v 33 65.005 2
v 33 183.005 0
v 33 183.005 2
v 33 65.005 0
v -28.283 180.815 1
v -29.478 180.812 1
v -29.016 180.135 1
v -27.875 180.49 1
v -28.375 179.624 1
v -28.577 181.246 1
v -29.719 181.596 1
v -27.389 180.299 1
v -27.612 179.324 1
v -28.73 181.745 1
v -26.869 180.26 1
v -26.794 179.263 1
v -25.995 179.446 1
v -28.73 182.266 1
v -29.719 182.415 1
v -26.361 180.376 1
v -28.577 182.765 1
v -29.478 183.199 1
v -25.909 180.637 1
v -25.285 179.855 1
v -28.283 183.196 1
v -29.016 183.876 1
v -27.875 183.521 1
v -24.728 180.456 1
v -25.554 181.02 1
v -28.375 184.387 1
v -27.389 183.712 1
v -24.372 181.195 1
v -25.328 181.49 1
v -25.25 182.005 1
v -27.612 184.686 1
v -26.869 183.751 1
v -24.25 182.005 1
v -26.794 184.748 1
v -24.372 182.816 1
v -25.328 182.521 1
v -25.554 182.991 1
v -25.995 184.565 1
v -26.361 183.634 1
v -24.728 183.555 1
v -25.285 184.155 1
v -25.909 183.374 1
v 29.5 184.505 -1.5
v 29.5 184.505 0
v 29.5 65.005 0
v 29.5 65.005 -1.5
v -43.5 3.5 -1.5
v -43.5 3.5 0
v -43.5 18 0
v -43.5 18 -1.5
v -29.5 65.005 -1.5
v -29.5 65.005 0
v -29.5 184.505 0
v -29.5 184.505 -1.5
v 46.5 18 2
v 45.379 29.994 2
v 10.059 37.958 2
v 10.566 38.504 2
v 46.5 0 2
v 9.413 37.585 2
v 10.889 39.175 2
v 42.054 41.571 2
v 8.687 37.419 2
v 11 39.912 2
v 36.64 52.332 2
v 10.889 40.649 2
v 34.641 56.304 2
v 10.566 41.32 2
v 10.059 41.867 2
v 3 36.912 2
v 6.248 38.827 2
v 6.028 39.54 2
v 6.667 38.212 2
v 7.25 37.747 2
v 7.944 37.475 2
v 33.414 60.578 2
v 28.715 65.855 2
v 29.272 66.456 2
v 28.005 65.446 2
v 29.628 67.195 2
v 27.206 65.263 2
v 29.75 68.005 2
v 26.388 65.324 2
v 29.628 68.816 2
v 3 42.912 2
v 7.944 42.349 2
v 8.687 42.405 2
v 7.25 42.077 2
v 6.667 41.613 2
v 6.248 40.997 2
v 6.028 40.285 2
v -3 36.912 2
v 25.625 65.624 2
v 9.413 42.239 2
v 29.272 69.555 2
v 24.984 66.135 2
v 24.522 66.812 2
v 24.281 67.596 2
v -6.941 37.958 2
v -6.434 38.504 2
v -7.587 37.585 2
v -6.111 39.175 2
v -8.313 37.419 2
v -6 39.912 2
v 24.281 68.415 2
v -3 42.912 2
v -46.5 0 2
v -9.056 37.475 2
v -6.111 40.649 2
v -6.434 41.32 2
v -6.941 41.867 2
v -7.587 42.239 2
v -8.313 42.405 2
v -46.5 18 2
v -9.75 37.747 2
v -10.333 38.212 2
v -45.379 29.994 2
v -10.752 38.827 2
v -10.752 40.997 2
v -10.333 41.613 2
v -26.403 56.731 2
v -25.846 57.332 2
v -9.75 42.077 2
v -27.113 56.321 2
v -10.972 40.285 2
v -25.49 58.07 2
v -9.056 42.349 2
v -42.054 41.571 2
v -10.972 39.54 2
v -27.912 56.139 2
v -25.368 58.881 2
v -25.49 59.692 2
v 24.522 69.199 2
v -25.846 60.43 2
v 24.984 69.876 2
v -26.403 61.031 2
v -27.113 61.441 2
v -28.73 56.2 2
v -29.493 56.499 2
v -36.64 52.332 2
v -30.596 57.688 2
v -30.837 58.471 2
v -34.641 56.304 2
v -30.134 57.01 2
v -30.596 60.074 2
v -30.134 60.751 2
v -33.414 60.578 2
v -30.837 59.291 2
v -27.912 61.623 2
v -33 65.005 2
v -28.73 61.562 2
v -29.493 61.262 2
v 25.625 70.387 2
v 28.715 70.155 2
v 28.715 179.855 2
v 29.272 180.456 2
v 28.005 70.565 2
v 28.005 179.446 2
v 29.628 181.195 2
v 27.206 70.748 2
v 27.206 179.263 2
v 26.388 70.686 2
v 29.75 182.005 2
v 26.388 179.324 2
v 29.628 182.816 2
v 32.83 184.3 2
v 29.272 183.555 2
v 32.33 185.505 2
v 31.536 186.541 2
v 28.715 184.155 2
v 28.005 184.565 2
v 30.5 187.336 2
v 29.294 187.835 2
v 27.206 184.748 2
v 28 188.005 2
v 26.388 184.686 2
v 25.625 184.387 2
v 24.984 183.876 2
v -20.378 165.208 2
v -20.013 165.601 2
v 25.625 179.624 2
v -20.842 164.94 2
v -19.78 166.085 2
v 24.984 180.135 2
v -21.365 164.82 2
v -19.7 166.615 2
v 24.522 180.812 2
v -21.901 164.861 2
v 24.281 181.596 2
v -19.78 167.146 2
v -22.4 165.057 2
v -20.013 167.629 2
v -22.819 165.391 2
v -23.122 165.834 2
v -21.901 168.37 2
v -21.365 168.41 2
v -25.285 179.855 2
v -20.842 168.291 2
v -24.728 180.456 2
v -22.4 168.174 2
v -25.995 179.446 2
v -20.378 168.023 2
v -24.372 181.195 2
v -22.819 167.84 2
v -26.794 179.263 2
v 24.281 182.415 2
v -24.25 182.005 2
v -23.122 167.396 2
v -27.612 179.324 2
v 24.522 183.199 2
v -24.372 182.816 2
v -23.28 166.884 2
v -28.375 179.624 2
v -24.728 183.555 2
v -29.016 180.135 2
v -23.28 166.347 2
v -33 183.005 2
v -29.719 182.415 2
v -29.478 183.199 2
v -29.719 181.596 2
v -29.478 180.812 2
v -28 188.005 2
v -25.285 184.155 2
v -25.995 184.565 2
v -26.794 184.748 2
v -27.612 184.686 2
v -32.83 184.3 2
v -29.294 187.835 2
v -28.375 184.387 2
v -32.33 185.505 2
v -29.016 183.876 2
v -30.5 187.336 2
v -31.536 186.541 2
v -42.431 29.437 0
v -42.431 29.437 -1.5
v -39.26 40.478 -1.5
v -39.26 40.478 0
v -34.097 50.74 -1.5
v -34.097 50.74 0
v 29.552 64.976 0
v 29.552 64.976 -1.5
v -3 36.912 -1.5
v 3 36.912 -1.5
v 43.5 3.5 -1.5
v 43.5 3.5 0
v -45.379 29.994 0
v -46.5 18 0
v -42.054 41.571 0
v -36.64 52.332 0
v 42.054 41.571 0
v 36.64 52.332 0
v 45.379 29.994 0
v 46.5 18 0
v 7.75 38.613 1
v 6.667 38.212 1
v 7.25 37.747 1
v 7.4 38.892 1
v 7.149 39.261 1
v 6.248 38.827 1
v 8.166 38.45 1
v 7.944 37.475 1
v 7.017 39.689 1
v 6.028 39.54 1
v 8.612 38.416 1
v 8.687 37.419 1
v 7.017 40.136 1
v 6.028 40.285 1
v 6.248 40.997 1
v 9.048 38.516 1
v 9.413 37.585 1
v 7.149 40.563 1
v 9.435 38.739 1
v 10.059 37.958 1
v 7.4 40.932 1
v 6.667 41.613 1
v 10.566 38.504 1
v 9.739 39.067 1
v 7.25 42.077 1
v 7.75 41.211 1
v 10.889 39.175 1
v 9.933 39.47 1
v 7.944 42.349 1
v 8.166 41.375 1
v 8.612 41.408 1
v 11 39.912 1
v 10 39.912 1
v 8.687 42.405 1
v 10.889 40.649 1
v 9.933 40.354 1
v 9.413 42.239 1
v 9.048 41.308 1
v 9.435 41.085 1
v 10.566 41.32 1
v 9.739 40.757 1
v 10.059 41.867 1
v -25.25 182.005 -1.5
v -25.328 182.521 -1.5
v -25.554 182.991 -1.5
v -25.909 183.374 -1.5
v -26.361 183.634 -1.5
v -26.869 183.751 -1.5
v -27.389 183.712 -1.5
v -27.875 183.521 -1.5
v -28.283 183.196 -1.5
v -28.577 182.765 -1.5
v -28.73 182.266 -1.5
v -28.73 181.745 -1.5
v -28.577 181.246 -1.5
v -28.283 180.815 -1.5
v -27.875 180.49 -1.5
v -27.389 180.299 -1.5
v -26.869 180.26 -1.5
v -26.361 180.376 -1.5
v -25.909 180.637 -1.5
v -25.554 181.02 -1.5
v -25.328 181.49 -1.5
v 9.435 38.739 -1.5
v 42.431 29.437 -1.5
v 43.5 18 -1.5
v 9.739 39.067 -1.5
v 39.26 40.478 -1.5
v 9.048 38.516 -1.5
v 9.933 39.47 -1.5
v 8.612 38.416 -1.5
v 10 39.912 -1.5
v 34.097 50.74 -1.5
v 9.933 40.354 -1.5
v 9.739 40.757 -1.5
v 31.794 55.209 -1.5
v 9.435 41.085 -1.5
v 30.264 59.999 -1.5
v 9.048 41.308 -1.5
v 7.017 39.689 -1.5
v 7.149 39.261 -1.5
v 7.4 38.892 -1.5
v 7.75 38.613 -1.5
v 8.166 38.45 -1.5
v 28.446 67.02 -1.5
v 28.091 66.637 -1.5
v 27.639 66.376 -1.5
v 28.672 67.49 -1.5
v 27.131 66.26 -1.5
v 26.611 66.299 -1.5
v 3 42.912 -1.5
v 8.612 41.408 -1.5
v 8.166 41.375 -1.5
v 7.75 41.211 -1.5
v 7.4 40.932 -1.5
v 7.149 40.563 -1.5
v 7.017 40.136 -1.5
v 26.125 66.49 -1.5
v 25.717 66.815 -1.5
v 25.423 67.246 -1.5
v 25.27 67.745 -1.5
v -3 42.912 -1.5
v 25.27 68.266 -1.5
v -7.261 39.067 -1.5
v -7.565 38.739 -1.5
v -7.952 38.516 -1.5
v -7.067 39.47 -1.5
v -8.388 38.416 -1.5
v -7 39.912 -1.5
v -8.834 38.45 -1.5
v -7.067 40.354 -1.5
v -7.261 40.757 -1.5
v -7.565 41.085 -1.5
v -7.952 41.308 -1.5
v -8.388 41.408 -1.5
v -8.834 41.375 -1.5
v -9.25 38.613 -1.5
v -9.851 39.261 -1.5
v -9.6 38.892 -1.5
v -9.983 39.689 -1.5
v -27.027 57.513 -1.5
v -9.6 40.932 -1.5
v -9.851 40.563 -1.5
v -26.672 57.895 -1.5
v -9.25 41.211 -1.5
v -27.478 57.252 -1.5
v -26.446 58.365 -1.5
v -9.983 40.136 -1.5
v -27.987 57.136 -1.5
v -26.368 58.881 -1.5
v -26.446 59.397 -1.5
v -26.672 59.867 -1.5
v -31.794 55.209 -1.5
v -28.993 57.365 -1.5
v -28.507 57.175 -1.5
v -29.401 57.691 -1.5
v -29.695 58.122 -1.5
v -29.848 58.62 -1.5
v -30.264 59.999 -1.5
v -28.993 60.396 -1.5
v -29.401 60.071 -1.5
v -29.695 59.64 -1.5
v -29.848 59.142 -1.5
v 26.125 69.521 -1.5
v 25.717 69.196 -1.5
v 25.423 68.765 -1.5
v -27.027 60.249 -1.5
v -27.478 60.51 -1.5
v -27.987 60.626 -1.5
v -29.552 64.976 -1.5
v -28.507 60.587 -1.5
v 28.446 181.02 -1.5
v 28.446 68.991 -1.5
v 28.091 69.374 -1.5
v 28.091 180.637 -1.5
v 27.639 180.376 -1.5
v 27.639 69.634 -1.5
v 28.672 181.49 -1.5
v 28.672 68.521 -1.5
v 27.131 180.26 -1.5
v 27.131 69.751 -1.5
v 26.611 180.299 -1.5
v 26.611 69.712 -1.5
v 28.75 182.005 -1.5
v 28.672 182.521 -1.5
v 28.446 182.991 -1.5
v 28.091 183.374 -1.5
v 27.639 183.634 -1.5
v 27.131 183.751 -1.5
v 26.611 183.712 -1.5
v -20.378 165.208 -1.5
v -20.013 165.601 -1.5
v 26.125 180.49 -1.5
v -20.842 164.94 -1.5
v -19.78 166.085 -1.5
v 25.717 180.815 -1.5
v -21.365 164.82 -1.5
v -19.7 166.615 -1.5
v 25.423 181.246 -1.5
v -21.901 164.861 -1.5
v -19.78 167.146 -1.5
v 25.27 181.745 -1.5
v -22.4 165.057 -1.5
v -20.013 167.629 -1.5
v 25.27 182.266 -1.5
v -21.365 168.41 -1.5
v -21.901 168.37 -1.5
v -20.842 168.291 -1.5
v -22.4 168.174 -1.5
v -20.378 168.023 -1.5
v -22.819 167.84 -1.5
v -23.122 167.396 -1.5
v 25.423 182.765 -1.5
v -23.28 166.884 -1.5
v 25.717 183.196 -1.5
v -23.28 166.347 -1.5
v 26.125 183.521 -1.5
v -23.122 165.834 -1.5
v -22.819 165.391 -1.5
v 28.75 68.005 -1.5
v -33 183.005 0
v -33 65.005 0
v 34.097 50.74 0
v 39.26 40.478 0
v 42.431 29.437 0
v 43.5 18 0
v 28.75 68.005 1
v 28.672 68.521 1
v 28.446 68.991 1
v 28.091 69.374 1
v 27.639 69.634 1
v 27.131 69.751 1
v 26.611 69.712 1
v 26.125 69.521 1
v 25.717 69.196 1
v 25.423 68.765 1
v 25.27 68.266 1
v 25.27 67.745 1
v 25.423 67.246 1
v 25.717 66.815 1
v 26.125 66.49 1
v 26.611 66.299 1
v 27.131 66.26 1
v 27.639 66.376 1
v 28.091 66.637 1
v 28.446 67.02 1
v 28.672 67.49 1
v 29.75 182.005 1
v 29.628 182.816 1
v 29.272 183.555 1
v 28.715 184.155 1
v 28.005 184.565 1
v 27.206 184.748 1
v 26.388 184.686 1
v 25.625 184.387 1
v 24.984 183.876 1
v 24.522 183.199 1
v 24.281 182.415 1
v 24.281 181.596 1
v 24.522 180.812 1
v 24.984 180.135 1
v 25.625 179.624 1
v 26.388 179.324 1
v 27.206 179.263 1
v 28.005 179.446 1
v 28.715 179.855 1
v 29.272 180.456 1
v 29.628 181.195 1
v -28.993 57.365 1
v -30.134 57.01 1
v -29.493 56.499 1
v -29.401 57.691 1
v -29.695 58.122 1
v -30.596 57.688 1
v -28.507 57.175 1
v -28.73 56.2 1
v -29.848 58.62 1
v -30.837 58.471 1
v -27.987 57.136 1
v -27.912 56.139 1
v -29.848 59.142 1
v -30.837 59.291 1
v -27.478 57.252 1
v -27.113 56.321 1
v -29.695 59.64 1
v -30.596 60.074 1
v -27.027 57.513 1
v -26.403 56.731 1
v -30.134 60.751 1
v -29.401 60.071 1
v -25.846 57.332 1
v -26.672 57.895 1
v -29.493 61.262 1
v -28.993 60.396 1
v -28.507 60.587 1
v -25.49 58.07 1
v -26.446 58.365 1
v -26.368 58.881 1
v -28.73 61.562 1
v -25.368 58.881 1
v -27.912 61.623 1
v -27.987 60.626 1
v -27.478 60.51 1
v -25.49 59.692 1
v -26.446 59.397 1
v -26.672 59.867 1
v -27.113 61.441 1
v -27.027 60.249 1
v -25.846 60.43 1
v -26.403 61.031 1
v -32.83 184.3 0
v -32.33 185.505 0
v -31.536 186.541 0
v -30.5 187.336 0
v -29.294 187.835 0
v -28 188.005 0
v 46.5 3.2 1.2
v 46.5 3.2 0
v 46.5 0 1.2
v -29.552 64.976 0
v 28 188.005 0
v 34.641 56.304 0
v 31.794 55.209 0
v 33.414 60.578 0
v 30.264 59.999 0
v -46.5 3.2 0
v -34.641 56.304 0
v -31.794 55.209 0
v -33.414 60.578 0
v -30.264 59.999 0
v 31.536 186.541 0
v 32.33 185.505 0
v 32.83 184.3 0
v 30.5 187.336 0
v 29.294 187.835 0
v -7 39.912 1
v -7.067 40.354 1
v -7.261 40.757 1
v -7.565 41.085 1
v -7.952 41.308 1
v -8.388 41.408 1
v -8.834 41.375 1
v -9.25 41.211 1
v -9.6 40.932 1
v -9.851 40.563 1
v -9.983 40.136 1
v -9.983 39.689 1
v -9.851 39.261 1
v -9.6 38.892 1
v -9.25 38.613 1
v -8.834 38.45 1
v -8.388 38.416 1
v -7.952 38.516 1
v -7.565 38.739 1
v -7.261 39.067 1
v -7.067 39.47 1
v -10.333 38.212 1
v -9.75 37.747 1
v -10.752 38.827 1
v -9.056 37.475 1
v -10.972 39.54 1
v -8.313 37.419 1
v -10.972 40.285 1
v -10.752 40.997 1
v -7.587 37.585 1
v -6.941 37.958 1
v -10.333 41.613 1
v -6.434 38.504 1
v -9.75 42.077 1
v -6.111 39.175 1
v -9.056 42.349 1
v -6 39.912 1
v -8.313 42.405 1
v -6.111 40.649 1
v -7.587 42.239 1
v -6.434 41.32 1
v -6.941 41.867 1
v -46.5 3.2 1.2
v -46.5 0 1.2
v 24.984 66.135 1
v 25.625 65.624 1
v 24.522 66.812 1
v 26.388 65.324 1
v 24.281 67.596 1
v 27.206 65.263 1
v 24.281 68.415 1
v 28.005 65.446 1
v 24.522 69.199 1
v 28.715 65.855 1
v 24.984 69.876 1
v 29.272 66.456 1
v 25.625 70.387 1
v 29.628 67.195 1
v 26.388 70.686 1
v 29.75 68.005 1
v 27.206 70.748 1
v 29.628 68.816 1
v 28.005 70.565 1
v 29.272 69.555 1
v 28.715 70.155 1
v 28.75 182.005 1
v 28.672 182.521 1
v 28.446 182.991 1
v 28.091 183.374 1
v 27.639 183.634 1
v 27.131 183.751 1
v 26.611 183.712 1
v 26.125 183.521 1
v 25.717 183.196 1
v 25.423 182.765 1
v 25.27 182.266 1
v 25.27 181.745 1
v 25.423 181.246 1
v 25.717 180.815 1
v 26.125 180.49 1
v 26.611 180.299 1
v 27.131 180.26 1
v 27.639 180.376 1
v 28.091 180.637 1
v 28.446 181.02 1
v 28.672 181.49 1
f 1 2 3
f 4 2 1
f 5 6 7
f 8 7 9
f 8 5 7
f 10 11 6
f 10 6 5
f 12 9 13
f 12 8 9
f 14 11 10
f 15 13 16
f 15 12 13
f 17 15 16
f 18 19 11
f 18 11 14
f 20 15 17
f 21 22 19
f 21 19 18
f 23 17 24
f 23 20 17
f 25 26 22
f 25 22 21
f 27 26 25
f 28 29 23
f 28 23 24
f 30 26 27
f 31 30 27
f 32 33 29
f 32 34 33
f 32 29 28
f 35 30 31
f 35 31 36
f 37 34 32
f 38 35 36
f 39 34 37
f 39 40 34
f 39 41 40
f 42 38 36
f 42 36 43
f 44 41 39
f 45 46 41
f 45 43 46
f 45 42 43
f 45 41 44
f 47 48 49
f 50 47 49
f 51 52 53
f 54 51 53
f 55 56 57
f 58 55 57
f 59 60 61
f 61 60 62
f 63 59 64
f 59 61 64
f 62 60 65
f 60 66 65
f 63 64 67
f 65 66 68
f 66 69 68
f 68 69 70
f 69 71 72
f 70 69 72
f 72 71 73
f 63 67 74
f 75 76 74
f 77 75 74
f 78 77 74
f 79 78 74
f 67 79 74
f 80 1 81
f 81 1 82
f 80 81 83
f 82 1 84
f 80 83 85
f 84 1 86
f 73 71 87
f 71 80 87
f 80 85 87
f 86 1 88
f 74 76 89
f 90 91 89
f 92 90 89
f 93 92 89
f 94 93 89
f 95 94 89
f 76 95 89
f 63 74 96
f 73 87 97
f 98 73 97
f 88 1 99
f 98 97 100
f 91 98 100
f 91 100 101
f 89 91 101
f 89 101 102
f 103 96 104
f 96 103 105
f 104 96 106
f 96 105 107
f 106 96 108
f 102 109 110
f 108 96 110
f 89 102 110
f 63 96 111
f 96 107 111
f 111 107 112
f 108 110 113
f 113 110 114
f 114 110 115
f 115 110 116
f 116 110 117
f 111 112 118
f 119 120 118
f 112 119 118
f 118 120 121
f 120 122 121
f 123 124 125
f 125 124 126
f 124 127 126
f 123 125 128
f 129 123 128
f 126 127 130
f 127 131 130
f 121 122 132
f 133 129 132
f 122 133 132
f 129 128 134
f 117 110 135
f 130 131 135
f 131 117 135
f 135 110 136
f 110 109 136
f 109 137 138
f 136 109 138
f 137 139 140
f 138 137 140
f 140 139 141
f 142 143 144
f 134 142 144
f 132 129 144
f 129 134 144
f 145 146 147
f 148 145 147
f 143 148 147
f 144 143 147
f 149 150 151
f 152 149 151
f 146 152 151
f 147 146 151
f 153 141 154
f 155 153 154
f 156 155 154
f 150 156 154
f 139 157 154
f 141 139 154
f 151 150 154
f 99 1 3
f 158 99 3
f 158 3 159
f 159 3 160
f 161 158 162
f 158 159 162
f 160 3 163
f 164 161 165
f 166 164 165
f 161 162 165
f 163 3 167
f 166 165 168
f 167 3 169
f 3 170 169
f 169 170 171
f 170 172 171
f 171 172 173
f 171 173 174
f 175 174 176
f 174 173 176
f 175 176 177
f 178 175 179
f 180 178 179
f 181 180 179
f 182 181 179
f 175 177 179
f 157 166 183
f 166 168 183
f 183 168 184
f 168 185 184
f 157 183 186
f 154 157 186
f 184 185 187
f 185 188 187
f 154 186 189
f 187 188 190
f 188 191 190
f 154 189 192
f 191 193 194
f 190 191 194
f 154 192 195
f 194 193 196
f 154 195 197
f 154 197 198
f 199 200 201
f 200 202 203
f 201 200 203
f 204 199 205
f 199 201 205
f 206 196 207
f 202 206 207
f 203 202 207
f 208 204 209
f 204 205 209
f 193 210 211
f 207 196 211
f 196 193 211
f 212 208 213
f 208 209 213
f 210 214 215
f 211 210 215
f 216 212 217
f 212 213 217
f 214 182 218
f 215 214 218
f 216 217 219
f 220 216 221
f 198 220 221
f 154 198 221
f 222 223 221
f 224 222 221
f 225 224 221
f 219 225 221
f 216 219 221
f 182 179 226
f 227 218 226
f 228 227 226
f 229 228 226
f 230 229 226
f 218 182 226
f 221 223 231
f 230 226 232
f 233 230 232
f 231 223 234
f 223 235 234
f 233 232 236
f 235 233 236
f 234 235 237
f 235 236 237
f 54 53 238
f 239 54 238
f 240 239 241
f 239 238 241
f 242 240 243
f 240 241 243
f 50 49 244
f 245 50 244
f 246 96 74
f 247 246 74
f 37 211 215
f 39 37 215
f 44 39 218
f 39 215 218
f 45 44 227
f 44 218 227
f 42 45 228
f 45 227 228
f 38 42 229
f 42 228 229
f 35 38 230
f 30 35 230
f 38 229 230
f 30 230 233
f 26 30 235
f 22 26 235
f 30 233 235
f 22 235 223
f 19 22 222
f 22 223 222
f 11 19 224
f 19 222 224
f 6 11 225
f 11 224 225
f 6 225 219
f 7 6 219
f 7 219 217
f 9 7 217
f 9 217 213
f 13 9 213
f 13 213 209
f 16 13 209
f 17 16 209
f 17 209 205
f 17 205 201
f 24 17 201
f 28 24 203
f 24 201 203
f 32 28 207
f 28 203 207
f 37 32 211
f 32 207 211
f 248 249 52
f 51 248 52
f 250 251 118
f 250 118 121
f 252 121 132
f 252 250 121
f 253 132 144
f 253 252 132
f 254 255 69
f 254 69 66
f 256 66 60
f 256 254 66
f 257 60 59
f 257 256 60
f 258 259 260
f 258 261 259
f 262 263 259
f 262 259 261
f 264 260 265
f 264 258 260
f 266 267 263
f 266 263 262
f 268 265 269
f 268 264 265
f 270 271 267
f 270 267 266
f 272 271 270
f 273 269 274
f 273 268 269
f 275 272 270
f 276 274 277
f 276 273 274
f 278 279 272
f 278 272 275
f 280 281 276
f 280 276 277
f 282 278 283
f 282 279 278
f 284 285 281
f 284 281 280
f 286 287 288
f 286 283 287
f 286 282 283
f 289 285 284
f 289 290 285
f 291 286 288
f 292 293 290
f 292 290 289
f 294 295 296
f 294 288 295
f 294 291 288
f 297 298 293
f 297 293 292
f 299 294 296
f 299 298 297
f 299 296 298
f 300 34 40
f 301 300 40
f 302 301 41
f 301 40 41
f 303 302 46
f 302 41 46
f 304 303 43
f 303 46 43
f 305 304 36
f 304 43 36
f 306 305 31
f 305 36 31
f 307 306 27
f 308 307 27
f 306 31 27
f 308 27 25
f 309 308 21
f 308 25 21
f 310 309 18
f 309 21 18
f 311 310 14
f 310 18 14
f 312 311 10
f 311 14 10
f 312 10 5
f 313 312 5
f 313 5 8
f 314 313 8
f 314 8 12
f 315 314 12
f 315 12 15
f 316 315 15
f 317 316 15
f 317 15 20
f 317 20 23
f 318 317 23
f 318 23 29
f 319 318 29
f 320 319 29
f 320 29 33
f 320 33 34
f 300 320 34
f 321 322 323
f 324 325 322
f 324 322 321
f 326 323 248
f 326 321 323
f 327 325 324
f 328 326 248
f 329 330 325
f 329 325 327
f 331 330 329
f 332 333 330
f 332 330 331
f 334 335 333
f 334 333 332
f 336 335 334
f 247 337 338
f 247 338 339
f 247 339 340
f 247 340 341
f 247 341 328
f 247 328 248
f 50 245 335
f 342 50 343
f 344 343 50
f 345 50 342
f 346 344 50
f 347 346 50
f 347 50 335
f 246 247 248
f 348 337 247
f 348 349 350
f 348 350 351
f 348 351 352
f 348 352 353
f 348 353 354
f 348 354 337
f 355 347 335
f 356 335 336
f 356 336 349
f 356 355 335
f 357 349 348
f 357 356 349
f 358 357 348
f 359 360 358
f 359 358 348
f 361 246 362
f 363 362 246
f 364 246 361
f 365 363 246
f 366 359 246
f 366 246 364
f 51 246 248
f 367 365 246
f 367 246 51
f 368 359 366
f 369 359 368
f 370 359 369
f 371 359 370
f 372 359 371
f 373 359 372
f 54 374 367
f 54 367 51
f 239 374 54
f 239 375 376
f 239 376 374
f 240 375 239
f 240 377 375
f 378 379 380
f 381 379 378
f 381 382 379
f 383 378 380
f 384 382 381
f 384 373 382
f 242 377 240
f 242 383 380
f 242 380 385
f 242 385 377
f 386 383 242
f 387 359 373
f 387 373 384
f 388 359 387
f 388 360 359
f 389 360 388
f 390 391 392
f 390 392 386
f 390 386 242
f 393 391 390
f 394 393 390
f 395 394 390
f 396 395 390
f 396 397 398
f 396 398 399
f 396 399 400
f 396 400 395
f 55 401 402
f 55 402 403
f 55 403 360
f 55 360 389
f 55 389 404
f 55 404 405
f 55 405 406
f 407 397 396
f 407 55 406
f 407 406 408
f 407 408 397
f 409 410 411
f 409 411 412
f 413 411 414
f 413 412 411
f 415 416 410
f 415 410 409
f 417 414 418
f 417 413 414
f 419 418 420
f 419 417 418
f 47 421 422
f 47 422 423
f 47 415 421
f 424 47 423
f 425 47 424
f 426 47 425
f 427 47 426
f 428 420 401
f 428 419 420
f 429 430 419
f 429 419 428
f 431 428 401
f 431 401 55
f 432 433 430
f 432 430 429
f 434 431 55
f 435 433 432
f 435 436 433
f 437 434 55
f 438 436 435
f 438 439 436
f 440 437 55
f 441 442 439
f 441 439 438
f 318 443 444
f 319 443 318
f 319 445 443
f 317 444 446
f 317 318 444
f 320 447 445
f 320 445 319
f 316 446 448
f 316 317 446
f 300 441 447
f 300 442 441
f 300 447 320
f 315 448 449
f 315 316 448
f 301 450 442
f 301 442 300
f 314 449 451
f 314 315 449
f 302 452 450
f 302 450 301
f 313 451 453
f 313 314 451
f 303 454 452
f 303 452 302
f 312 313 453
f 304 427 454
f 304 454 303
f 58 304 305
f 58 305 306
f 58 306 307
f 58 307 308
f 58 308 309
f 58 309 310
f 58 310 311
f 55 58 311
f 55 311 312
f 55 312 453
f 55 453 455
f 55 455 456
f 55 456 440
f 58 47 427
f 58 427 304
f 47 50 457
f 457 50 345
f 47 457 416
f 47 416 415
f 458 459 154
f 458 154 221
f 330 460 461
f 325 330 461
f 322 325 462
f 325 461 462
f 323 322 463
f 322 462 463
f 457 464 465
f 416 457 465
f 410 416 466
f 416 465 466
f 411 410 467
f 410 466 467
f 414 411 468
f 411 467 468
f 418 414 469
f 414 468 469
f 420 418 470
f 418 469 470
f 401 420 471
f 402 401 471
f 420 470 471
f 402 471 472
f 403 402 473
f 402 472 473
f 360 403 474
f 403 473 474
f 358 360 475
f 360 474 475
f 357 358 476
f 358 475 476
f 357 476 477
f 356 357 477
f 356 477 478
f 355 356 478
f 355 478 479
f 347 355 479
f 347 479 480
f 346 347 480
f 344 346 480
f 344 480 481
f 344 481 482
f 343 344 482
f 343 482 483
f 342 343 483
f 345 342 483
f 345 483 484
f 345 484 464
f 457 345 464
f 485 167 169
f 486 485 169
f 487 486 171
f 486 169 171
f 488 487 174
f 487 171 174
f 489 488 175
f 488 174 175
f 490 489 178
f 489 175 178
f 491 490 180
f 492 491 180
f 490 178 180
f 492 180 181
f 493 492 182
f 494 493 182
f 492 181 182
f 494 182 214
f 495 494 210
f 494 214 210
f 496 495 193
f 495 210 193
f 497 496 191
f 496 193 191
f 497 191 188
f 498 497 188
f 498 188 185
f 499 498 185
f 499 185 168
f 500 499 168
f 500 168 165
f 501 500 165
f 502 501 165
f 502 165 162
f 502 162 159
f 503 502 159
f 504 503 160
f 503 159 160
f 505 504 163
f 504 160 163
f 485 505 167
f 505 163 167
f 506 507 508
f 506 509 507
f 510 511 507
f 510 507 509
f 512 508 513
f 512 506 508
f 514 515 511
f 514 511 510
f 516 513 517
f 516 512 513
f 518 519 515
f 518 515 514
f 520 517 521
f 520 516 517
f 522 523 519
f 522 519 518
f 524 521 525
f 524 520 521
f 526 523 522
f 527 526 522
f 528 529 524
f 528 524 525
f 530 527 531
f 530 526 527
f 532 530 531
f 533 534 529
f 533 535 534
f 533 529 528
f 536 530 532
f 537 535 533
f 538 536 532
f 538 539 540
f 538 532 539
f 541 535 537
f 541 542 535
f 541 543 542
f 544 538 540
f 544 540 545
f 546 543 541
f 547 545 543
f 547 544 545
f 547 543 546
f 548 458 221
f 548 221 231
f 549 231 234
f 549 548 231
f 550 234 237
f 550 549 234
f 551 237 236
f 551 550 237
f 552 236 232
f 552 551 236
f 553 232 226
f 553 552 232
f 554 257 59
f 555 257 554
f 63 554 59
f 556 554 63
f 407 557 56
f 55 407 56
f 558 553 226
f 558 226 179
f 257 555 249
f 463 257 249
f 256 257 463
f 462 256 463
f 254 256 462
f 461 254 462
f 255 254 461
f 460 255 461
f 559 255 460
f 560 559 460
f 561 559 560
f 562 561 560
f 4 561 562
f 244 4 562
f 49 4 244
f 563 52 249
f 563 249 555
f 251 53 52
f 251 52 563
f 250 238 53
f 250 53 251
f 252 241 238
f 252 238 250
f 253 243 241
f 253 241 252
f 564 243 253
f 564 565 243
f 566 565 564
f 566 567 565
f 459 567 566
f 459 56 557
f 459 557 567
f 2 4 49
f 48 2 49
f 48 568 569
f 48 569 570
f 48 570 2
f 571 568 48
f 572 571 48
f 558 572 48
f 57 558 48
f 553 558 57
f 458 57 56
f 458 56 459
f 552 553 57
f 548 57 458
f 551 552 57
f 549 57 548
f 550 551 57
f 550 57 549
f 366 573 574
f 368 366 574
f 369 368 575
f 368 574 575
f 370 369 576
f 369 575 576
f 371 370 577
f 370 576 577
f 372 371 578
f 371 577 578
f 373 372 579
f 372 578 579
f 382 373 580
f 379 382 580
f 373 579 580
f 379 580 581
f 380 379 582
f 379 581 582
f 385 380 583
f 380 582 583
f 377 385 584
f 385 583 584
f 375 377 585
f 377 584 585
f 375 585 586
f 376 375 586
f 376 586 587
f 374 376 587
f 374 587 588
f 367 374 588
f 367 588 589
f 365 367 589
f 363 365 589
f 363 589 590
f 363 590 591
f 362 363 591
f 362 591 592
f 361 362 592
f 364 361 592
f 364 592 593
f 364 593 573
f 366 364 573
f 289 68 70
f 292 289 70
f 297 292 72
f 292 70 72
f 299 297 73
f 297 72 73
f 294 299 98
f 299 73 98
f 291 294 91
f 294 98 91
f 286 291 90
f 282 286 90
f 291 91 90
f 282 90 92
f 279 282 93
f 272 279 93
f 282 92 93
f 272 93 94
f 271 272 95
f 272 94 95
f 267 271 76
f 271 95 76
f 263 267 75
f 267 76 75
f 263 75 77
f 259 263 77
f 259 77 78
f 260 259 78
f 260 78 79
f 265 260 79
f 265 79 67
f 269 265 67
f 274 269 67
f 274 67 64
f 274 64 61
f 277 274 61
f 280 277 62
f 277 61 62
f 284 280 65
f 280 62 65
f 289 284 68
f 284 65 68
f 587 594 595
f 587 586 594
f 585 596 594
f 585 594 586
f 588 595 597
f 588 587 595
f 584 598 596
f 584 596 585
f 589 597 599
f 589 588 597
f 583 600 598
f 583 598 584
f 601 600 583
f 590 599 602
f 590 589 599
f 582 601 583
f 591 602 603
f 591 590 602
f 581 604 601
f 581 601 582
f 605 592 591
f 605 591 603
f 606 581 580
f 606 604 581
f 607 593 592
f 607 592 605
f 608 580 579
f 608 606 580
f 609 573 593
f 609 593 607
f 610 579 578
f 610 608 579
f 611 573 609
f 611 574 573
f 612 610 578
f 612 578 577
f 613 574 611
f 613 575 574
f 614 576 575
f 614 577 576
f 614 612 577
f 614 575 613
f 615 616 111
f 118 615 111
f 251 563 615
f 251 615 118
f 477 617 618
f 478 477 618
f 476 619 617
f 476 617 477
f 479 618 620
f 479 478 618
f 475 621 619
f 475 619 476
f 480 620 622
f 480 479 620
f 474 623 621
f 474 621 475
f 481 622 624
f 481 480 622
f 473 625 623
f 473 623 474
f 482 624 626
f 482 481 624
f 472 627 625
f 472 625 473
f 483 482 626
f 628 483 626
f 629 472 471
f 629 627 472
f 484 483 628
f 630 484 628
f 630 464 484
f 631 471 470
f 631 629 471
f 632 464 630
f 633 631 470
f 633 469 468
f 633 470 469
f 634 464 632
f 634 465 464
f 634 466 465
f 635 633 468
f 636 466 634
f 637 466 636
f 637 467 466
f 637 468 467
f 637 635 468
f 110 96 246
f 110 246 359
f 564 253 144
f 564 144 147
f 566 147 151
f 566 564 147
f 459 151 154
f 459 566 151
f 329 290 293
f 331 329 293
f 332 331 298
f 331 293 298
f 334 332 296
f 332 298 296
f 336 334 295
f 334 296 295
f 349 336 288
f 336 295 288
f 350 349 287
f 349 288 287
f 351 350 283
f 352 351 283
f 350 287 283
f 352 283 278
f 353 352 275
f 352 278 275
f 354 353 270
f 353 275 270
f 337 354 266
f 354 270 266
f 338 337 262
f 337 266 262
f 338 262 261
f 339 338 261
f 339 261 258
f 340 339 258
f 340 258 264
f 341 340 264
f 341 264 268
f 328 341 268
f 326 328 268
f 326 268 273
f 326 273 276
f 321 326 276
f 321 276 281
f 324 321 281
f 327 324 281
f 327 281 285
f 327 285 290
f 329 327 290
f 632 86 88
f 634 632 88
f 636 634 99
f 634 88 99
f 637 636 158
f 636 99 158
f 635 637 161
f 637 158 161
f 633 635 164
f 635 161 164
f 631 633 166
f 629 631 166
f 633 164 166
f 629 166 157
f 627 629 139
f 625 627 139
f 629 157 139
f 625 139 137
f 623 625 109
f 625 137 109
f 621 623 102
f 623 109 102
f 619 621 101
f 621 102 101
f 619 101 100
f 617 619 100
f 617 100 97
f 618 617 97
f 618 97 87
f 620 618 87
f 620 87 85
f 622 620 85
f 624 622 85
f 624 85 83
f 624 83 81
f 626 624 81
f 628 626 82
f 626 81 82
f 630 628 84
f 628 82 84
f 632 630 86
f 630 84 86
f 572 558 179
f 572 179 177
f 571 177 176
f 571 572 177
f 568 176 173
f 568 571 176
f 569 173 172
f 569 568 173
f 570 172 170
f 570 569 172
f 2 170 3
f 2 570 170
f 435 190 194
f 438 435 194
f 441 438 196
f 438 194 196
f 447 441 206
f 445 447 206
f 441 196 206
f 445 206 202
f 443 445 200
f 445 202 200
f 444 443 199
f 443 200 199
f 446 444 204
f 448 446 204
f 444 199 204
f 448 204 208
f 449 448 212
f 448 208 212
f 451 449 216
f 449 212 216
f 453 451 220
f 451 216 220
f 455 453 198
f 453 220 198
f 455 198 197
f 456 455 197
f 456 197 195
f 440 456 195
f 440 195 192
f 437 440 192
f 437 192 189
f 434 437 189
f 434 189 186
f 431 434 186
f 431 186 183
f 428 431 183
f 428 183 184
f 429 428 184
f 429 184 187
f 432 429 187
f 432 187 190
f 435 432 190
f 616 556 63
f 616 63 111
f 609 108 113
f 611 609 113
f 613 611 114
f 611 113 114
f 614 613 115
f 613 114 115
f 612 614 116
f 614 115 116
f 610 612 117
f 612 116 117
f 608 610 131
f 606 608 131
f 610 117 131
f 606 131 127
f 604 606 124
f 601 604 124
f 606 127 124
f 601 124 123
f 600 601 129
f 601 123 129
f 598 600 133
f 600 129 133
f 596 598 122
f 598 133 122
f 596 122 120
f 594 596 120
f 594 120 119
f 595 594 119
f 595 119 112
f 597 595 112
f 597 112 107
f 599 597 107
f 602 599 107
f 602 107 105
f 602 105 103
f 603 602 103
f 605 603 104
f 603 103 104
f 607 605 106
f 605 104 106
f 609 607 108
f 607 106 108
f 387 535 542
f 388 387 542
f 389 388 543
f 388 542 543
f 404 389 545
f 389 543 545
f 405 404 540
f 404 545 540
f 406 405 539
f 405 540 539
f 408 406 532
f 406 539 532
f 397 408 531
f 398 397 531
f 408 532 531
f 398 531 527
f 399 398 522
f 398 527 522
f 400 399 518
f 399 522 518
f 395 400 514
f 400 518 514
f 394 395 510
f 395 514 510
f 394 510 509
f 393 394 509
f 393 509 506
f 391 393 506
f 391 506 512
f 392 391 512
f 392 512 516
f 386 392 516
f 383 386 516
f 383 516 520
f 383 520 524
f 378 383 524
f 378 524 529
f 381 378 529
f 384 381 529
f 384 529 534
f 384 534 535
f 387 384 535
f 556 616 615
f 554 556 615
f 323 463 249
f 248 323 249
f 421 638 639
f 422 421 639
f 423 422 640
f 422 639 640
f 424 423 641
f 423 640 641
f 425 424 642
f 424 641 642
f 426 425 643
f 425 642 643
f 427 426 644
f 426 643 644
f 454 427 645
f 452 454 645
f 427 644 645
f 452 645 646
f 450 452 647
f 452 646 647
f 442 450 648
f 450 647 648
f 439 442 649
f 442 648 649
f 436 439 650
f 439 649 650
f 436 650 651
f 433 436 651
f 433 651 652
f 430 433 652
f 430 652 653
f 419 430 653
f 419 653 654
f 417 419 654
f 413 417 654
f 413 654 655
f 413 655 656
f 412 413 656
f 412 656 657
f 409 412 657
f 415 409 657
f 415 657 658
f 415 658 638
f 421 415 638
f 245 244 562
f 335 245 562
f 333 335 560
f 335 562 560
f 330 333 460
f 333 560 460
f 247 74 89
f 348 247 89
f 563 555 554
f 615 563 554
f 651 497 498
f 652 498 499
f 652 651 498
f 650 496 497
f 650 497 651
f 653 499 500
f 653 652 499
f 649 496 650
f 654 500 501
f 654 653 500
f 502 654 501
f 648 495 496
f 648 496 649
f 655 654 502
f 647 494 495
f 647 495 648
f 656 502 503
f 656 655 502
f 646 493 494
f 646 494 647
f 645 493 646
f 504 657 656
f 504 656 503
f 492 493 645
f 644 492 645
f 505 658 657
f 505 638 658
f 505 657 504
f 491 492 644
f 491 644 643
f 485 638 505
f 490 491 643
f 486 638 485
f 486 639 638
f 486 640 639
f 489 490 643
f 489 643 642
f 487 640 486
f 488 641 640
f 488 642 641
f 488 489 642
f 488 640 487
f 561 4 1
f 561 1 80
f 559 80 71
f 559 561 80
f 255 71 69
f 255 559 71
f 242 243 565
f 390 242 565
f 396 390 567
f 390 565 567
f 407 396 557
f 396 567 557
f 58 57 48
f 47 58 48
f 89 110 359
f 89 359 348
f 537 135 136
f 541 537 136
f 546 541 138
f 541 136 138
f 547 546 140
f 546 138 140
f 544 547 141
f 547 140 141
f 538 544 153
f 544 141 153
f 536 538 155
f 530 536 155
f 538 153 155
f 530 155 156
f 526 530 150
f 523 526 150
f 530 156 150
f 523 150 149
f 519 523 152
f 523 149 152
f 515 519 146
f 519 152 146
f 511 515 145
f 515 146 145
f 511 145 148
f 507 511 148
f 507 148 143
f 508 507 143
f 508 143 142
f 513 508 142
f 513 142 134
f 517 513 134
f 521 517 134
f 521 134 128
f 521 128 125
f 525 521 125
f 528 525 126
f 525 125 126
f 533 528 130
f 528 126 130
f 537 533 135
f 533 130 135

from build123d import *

# Parameters (mm, degrees)
BOSS_EXTRUDE1_DEPTH = 1.5
BOSS_EXTRUDE2_DEPTH = 2
SKETCH3_W           = 1.2
SKETCH3_H           = 3.2
CUT_EXTRUDE1_DEPTH  = 210.759497368
SKETCH4_R           = 1.75
SKETCH4_R_2         = 1.5
SKETCH4_W           = 6
SKETCH4_H           = 6
CUT_EXTRUDE2_DEPTH  = 194.70221149
SKETCH5_R           = 2.75
SKETCH5_R_2         = 2.5
CUT_EXTRUDE3_DEPTH  = 1
SKETCH6_R           = 1.8
CUT_EXTRUDE4_DEPTH  = 194.70221149


with BuildPart() as part:
    # Sketch1 → Boss-Extrude1 (new body)
    with BuildSketch(Plane.XY):
        with BuildLine():
            Line((-43.5, 3.5), (-43.5, 18))
            ThreePointArc((-43.5, 18), (-41.102679313, 35.031824172), (-34.097009983, 50.740127019))
            ThreePointArc((-34.097009983, 50.740127019), (-30.928959041, 57.572199931), (-29.55199189, 64.976099479))
            Line((-29.55199189, 64.976099479), (-29.5, 65.005443368))
            Line((-29.5, 65.005443368), (-29.5, 184.505443368))
            Line((-29.5, 184.505443368), (29.5, 184.505443368))
            Line((29.5, 184.505443368), (29.5, 65.005443368))
            Line((29.5, 65.005443368), (29.55199189, 64.976099479))
            ThreePointArc((29.55199189, 64.976099479), (30.928959041, 57.572199931), (34.097009983, 50.740127019))
            ThreePointArc((34.097009983, 50.740127019), (41.102679313, 35.031824172), (43.5, 18))
            Line((43.5, 18), (43.5, 3.5))
            Line((43.5, 3.5), (-43.5, 3.5))
        make_face()
    extrude(amount=-BOSS_EXTRUDE1_DEPTH)

    # Sketch2 → Boss-Extrude2 (add)
    with BuildSketch(Plane.XY):
        with BuildLine():
            Line((-46.5, 3), (-46.5, 18))
            ThreePointArc((-46.5, 18), (-43.986116227, 35.859949502), (-36.639815607, 52.332025117))
            ThreePointArc((-36.639815607, 52.332025117), (-33.927981976, 58.412572449), (-33, 65.005443368))
            Line((-33, 65.005443368), (-33, 183.005443368))
            ThreePointArc((-33, 183.005443368), (-31.535533906, 186.540977274), (-28, 188.005443368))
            Line((-28, 188.005443368), (28, 188.005443368))
            ThreePointArc((28, 188.005443368), (31.535533906, 186.540977274), (33, 183.005443368))
            Line((33, 183.005443368), (33, 65.005443368))
            ThreePointArc((33, 65.005443368), (33.927981976, 58.412572449), (36.639815607, 52.332025117))
            ThreePointArc((36.639815607, 52.332025117), (43.986116227, 35.859949502), (46.5, 18))
            Line((46.5, 18), (46.5, 3))
            Line((46.5, 3), (46.5, 0))
            Line((46.5, 0), (-46.5, 0))
            Line((-46.5, 0), (-46.5, 3))
        make_face()
    extrude(amount=BOSS_EXTRUDE2_DEPTH)

    # Sketch3 → Cut-Extrude1 (cut, through all)
    with BuildSketch(Plane.ZY.offset(46.5)):
        with Locations((0.6, 1.6)):
            Rectangle(SKETCH3_W, SKETCH3_H)
    extrude(amount=-CUT_EXTRUDE1_DEPTH, mode=Mode.SUBTRACT)

    # Sketch4 → Cut-Extrude2 (cut, through all)
    with BuildSketch(Plane.XY.offset(2)):
        with Locations((-27, 182.005443368)):
            Circle(SKETCH4_R)
        with Locations((27, 182.005443368)):
            Circle(SKETCH4_R)
        with Locations((-28.117843442, 58.880926182)):
            Circle(SKETCH4_R)
        with Locations((27, 68.005443368)):
            Circle(SKETCH4_R)
        with Locations((-8.5, 39.912117831)):
            Circle(SKETCH4_R_2)
        with Locations((8.5, 39.912117831)):
            Circle(SKETCH4_R_2)
        with Locations((0, 39.912117831)):
            Rectangle(SKETCH4_W, SKETCH4_H)
    extrude(amount=-CUT_EXTRUDE2_DEPTH, mode=Mode.SUBTRACT)

    # Sketch5 → Cut-Extrude3 (cut)
    with BuildSketch(Plane.XY.offset(2)):
        with Locations((27, 182.005443368)):
            Circle(SKETCH5_R)
        with Locations((-27, 182.005443368)):
            Circle(SKETCH5_R)
        with Locations((-28.117843442, 58.880926182)):
            Circle(SKETCH5_R)
        with Locations((-8.5, 39.912117831)):
            Circle(SKETCH5_R_2)
        with Locations((8.5, 39.912117831)):
            Circle(SKETCH5_R_2)
        with Locations((27, 68.005443368)):
            Circle(SKETCH5_R)
    extrude(amount=-CUT_EXTRUDE3_DEPTH, mode=Mode.SUBTRACT)

    # Sketch6 → Cut-Extrude4 (cut, through all)
    with BuildSketch(Plane.XY.offset(2)):
        with Locations((-21.5, 166.615388867)):
            Circle(SKETCH6_R)
    extrude(amount=-CUT_EXTRUDE4_DEPTH, mode=Mode.SUBTRACT)


solid = part.part
